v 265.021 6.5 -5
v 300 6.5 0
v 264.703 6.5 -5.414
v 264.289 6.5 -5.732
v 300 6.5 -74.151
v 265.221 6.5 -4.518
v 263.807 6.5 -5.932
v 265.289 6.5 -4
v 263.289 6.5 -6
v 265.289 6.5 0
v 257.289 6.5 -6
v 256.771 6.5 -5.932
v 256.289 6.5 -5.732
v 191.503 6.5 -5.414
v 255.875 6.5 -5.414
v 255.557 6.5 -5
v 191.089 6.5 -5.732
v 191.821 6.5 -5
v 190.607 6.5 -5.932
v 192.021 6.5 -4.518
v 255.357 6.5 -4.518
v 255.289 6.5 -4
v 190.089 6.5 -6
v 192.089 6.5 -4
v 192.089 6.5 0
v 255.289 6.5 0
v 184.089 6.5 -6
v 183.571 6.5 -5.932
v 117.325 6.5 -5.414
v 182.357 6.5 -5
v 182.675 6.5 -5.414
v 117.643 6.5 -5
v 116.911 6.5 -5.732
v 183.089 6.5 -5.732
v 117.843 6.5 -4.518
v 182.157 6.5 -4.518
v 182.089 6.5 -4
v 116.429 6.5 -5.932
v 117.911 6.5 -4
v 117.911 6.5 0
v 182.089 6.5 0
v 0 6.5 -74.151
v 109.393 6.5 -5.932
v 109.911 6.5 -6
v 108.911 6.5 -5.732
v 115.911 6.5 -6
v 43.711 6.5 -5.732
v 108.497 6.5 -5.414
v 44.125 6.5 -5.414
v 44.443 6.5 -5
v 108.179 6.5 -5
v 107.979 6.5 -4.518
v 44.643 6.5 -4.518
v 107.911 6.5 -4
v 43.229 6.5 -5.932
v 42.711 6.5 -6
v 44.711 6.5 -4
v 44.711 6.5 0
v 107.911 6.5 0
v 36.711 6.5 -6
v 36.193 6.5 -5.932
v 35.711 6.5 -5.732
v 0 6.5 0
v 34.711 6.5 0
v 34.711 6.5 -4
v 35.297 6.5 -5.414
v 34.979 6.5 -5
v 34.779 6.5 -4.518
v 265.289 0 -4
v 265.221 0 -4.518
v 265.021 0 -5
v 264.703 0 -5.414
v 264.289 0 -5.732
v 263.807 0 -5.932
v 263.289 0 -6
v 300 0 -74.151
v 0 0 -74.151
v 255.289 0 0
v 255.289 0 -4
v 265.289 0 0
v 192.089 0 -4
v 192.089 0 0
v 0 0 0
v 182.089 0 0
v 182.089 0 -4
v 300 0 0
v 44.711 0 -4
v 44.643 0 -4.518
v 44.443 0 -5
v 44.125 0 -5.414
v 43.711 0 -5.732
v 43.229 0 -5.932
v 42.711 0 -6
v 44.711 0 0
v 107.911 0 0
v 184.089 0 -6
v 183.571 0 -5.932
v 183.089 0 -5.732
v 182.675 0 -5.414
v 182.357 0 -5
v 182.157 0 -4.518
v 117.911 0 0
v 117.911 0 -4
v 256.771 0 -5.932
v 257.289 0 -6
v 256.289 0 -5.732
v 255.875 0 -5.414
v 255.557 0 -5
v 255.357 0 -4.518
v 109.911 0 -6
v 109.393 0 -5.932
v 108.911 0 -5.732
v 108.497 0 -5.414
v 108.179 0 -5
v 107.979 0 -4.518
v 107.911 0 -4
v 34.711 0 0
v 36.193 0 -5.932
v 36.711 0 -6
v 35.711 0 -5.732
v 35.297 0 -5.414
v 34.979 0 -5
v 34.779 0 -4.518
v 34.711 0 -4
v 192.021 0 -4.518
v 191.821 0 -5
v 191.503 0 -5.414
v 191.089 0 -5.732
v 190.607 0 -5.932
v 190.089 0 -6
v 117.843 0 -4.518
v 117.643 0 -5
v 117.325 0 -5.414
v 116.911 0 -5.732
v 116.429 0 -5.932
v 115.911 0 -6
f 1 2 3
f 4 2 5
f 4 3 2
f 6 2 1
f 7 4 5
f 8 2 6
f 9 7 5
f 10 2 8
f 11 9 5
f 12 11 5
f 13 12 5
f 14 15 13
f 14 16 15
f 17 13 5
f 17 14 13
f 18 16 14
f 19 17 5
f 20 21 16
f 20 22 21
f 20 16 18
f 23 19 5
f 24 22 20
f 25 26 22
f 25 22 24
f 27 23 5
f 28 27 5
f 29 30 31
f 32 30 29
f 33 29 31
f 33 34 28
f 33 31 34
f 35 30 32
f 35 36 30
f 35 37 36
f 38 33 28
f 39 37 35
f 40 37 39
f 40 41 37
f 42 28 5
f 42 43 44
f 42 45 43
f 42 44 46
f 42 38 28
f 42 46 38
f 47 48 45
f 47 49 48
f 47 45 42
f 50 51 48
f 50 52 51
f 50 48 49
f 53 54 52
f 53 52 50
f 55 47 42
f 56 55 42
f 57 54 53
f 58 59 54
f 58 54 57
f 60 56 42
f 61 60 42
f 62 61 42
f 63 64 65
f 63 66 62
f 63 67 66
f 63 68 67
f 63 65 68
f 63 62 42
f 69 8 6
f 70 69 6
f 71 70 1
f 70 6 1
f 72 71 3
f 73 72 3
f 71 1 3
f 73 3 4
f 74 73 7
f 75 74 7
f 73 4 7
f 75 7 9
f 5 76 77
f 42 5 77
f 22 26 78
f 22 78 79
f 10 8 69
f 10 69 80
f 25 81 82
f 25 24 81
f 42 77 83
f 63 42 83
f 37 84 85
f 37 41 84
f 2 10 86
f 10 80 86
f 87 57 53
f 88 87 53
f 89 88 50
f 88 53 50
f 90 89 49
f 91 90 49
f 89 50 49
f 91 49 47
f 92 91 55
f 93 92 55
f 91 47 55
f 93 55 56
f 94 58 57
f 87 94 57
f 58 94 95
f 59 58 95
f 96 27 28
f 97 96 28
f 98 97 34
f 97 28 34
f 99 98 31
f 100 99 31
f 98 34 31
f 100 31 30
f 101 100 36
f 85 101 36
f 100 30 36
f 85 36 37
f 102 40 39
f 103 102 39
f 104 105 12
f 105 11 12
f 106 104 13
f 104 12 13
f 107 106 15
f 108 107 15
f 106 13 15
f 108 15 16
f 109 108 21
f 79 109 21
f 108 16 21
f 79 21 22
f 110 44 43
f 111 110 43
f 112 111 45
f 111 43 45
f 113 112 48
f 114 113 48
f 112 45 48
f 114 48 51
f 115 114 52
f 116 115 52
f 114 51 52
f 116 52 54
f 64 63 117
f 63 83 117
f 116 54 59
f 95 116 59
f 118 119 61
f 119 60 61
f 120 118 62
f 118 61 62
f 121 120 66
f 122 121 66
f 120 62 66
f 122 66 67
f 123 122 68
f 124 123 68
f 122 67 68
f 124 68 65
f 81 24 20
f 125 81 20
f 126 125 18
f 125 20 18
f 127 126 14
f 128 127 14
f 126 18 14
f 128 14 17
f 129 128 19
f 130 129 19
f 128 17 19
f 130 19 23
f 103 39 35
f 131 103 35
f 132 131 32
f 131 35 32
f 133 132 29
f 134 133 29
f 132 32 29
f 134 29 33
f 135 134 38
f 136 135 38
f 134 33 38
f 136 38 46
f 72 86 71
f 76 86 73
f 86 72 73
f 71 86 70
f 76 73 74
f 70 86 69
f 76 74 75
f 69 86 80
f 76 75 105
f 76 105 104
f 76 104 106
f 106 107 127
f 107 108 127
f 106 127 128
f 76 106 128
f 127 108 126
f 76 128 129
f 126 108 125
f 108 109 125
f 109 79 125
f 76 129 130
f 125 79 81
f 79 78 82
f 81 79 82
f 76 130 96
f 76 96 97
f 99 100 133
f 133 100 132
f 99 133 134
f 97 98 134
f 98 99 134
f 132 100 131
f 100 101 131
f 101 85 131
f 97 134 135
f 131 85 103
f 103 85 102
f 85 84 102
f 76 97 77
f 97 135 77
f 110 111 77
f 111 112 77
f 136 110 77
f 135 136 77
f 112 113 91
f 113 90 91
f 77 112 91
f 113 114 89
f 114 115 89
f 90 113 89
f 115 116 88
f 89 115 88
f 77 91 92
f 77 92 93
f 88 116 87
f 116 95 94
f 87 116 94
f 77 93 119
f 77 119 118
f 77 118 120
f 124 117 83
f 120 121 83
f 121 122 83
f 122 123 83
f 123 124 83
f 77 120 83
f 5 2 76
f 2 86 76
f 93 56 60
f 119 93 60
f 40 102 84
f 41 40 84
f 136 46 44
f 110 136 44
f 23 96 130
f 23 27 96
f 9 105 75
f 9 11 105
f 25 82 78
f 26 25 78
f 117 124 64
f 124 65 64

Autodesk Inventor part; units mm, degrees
ref_plane "YZ Plane" through (0, 0, 0) normal (1, 0, 0) x (0, 1, 0)
ref_plane "XZ Plane" through (0, 0, 0) normal (0, 1, 0) x (-1, 0, 0)
ref_plane "XY Plane" through (0, 0, 0) normal (0, 0, 1) x (1, 0, 0)
sketch "Sketch1" plane through (0, 0, 0) normal (0, 1, 0) x (-1, 0, 0)
  line L0 (0, 0) -> (-300, 0)
  line L1 (-300, 0) -> (-300, -74.151)
  line L2 (-300, -74.151) -> (0, -74.151)
  line L3 (0, -74.151) -> (0, 0)
  dimension "d0" = 300
  dimension "d1" = 74.151
extrude "Extrusion1" add sketch "Sketch1" along normal blind 6.5
sketch "Sketch2" plane through (0, 6.5, 0) normal (0, 1, 0) x (1, 0, 0)
  line L0 (0, 0) -> (300, 0) projected
  line L1 (300, 74.151) -> (0, 74.151) projected
  line L2 (150, 74.151) -> (150, 0) construction
  line L3 (34.711, 0) -> (44.711, 0)
  line L4 (44.711, 0) -> (44.711, 4)
  line L5 (42.711, 6) -> (36.711, 6)
  line L6 (34.711, 4) -> (34.711, 0)
  line L7 (107.911, 0) -> (117.911, 0)
  line L8 (117.911, 0) -> (117.911, 4)
  line L9 (115.911, 6) -> (109.911, 6)
  line L10 (107.911, 4) -> (107.911, 0)
  arc A0 (36.711, 6) -> (34.711, 4) centre (36.711, 4) ccw
  arc A1 (44.711, 4) -> (42.711, 6) centre (42.711, 4) ccw
  arc A2 (109.911, 6) -> (107.911, 4) centre (109.911, 4) ccw
  arc A3 (117.911, 4) -> (115.911, 6) centre (115.911, 4) ccw
  line L11 (265.289, 0) -> (255.289, 0)
  line L12 (255.289, 0) -> (255.289, 4)
  line L13 (257.289, 6) -> (263.289, 6)
  line L14 (265.289, 4) -> (265.289, 0)
  line L15 (192.089, 0) -> (182.089, 0)
  line L16 (182.089, 0) -> (182.089, 4)
  line L17 (184.089, 6) -> (190.089, 6)
  line L18 (192.089, 4) -> (192.089, 0)
  arc A4 (265.289, 4) -> (263.289, 6) centre (263.289, 4) ccw
  arc A5 (257.289, 6) -> (255.289, 4) centre (257.289, 4) ccw
  arc A6 (192.089, 4) -> (190.089, 6) centre (190.089, 4) ccw
  arc A7 (184.089, 6) -> (182.089, 4) centre (184.089, 4) ccw
  point P0 (39.711, 6)
  point P1 (112.911, 6)
  point P2 (260.289, 6)
  point P3 (187.089, 6)
  dimension "d10" = 2
  dimension "d11" = 73.2
  dimension "d12" = 37.089
  dimension "d13" = 10
  dimension "d14" = 10
  dimension "d15" = 6
extrude "Extrusion2" cut sketch "Sketch2" against normal through all
equation "\"d13\" = d14"
properties part number "front_panel_bottom"
